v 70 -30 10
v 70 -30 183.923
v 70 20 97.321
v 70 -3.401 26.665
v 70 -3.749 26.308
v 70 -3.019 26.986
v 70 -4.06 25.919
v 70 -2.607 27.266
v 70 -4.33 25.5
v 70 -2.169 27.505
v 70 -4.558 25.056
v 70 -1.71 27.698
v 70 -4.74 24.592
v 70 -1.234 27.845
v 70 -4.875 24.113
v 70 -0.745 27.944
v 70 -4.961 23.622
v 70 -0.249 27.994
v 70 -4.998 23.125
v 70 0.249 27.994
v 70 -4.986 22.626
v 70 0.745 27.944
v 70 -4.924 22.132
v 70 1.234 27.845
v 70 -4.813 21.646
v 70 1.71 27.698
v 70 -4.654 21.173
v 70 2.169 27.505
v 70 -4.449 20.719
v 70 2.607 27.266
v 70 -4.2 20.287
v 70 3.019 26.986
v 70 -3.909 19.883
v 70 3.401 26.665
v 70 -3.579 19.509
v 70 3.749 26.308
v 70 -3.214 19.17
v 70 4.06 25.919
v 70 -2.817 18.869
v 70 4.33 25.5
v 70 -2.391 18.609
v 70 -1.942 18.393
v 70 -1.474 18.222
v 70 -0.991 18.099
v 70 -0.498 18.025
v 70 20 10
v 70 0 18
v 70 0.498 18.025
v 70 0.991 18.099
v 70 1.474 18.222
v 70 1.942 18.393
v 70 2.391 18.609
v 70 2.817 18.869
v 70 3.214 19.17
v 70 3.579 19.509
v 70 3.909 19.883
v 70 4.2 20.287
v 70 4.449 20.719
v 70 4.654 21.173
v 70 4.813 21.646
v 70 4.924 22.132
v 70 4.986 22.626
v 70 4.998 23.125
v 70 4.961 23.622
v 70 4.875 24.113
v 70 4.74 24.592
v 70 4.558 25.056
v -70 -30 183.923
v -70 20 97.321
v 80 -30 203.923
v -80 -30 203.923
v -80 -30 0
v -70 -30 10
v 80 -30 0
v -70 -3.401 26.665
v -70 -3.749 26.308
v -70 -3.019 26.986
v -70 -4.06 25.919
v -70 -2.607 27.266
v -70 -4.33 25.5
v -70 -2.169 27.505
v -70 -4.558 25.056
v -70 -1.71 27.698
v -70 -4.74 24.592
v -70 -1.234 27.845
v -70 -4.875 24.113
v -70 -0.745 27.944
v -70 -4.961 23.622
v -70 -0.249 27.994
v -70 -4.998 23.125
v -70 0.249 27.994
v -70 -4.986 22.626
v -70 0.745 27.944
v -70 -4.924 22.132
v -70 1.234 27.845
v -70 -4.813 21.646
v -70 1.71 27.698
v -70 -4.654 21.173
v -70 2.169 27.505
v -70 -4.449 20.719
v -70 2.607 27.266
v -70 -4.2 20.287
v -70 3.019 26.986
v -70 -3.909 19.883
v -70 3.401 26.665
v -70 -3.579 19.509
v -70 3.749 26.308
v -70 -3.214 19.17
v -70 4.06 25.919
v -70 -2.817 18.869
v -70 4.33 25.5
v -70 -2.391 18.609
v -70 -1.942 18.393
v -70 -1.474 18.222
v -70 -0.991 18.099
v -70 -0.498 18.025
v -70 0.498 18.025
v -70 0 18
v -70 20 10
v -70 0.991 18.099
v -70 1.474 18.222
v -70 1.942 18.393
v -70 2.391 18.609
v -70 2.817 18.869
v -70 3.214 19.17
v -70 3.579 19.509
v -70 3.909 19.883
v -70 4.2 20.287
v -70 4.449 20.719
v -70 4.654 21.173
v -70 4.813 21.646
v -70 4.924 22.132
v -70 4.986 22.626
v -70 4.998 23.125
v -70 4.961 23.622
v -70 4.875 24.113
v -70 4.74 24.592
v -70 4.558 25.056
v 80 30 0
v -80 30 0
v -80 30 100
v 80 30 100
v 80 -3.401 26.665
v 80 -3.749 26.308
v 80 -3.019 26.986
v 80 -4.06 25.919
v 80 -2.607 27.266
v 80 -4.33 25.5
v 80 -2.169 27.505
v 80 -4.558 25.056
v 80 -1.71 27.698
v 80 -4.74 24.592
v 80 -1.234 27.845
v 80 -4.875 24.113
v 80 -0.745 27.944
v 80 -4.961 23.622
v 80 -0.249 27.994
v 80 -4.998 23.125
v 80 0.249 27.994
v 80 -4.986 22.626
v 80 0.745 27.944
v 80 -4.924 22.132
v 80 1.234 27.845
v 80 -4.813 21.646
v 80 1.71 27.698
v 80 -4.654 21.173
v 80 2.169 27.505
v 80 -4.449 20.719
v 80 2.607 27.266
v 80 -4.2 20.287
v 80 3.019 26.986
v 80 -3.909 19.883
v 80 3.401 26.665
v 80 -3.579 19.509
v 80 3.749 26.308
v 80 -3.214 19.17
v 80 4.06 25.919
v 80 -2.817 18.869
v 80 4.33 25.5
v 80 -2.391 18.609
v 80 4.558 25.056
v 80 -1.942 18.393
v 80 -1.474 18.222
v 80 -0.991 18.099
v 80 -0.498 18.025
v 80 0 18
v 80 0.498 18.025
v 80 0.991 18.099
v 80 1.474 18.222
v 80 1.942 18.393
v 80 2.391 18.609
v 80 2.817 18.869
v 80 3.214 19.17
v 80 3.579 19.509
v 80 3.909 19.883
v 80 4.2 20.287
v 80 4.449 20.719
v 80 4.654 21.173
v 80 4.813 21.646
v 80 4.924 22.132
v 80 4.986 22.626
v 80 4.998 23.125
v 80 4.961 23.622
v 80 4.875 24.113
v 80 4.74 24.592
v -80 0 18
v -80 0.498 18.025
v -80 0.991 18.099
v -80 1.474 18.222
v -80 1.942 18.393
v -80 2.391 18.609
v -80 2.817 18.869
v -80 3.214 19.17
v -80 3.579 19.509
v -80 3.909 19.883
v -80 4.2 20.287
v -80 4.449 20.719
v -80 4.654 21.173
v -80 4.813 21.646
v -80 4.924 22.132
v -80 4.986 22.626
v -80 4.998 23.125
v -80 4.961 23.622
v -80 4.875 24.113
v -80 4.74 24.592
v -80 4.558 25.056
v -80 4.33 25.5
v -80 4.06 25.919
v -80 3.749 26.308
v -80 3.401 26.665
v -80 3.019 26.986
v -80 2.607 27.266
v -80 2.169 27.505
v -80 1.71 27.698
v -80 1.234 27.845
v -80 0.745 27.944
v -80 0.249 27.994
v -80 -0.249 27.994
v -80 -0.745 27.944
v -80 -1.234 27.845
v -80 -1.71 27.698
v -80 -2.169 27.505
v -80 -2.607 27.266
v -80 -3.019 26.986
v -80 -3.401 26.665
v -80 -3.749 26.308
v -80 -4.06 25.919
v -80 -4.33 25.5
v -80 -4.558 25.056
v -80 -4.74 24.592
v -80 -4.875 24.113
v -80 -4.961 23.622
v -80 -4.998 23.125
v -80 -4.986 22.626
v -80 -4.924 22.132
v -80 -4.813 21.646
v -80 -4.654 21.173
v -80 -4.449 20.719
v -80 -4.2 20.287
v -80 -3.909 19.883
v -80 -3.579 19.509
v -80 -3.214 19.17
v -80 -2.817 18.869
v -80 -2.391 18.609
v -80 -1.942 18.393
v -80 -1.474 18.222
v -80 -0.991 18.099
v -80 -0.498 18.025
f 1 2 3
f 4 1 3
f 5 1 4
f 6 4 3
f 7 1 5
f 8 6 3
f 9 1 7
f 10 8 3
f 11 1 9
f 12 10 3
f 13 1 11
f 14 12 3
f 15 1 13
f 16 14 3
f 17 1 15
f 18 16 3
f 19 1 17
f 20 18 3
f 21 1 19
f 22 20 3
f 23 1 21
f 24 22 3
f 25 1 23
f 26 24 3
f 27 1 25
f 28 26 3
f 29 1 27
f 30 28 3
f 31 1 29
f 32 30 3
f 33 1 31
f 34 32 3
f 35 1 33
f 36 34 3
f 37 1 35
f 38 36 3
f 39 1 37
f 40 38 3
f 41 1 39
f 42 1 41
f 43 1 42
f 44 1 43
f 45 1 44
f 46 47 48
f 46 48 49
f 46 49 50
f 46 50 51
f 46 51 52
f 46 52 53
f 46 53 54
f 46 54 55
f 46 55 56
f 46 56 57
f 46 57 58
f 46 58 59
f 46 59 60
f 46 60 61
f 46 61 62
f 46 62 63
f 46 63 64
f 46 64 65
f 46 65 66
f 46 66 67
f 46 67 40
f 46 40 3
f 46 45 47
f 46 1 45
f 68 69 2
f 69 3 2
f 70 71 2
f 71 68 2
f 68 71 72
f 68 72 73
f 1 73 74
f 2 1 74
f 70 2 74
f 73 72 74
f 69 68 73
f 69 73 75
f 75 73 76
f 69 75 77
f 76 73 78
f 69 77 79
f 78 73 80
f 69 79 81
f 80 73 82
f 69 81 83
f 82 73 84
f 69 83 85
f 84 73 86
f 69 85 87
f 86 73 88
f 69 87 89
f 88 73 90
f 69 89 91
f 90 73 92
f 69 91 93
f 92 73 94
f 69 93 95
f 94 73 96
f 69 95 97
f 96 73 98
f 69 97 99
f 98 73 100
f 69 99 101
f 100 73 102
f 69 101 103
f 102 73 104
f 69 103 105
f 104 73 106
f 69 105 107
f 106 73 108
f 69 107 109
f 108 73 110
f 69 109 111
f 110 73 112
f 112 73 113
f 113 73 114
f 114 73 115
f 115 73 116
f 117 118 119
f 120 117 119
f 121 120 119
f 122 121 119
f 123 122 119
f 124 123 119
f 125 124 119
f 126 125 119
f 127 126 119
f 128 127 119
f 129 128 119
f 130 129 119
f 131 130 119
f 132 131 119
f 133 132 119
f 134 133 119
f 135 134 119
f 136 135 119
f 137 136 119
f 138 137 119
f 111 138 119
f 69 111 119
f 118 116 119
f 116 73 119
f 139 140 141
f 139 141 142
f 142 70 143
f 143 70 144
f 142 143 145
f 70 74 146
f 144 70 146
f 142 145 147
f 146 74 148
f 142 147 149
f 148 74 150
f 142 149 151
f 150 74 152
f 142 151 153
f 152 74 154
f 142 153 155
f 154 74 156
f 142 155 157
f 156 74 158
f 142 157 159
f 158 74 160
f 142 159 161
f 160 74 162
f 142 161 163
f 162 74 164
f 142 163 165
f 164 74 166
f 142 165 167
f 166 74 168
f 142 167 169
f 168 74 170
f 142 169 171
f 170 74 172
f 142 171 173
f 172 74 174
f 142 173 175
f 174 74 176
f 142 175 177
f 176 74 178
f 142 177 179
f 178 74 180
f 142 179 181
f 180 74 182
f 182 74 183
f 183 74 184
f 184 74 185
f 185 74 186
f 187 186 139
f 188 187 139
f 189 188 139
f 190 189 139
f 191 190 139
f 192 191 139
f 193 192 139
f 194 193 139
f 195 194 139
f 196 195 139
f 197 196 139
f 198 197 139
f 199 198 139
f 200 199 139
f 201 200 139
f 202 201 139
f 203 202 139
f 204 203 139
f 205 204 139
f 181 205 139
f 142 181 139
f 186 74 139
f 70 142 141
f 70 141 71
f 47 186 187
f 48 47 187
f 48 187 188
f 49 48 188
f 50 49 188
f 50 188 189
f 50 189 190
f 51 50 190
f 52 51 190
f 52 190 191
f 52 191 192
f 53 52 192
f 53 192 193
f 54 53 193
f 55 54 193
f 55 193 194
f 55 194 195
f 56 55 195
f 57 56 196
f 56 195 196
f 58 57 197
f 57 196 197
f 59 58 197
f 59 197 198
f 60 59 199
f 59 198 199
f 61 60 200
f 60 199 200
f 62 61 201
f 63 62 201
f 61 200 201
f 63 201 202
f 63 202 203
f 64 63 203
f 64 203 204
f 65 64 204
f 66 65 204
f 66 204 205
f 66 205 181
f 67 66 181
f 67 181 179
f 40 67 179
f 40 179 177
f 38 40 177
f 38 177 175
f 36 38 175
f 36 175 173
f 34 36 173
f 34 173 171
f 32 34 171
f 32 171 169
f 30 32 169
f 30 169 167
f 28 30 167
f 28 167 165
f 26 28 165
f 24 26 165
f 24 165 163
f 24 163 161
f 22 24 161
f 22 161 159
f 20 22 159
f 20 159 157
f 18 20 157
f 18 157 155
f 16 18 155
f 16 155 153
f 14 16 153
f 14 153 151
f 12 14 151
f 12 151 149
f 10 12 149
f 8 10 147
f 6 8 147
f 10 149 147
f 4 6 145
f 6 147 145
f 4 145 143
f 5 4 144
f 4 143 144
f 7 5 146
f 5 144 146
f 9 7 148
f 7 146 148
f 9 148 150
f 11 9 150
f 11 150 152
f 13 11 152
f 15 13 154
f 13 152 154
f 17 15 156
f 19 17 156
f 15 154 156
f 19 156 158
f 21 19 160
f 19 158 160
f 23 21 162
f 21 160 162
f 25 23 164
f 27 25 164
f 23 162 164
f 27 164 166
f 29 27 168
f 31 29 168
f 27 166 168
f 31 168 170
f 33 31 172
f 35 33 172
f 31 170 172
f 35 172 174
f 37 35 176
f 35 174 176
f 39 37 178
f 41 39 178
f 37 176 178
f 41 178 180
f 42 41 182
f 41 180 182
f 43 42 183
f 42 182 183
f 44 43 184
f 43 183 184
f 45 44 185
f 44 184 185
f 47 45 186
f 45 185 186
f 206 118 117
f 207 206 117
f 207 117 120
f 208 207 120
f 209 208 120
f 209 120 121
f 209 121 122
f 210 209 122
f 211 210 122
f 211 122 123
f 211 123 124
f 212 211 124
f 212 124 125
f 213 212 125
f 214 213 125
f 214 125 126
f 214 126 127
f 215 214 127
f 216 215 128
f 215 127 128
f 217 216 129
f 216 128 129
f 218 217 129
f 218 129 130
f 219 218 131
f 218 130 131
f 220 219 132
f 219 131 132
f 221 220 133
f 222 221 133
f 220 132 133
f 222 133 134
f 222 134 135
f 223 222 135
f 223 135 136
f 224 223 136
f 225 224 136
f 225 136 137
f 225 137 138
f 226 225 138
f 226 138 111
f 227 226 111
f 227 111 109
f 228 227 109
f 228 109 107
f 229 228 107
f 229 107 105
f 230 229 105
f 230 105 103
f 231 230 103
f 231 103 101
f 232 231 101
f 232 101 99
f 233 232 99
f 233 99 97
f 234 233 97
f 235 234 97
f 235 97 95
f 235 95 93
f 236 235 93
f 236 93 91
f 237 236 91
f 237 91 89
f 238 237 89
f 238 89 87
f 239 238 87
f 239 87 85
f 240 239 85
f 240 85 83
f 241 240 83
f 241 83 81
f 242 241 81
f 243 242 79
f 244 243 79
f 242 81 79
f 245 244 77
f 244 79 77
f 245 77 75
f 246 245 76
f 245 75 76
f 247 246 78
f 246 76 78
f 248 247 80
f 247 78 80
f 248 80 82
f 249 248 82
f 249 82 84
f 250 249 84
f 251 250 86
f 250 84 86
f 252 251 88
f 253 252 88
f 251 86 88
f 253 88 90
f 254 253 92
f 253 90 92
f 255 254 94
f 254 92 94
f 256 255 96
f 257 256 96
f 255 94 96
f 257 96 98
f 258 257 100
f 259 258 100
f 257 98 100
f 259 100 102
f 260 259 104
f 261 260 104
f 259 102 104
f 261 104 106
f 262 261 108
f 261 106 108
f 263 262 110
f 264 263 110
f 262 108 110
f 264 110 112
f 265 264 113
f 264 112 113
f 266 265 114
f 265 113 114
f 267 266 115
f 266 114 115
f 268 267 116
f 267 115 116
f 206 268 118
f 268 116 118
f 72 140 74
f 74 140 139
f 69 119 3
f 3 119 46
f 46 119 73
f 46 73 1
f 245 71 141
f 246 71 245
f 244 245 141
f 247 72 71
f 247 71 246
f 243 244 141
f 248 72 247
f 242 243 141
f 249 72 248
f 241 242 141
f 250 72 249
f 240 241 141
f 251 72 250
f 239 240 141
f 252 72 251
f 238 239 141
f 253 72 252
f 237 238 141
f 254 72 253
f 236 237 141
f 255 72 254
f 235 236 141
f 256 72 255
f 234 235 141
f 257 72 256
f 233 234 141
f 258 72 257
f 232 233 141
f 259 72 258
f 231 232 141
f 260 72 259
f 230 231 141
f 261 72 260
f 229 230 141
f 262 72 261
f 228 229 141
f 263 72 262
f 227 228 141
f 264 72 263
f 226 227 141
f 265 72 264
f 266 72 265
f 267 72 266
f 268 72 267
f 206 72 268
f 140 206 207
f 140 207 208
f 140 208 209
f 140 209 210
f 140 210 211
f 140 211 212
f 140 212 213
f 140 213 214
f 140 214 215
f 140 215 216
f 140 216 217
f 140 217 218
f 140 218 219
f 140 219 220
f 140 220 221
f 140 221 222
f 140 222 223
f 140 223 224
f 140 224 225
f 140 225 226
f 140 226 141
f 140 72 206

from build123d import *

# Parameters (mm, degrees)
SKETCH2_W           = 160
SKETCH2_H           = 60
BOSS_EXTRUDE1_DEPTH = 230
CUT_EXTRUDE1_REACH  = 162
SHELL1_T            = -10
SKETCH5_R           = 5
CUT_EXTRUDE2_DEPTH  = 161


with BuildPart() as part:
    # Sketch2 → Boss-Extrude1 (new body)
    with BuildSketch(Plane.XY):
        Rectangle(SKETCH2_W, SKETCH2_H)
    extrude(amount=BOSS_EXTRUDE1_DEPTH)

    # Sketch3 → Cut-Extrude1 (cut, up to next)
    with BuildSketch(Plane(origin=(80, 0, 0), x_dir=(0, 0, -1), z_dir=(1, 0, 0)), mode=Mode.PRIVATE) as cut_extrude1_sk1:
        Polygon((-100, 30), (-203.923048454, -30), (-230, -30), (-230, 30), align=None)
    cut_extrude1_tool1 = extrude(cut_extrude1_sk1.sketch, amount=-CUT_EXTRUDE1_REACH, mode=Mode.PRIVATE) & part.part
    add(cut_extrude1_tool1.solids().sort_by_distance((80, 6.658449, 185.214376))[0], mode=Mode.SUBTRACT)

    # Shell1
    shell1_openings = [part.faces().sort_by_distance(p)[0] for p in [
        (0, -30, 101.961524227),
    ]]
    offset(amount=SHELL1_T, openings=shell1_openings, kind=Kind.INTERSECTION)

    # Sketch5 → Cut-Extrude2 (cut, through all)
    with BuildSketch(Plane(origin=(80, 0, 0), x_dir=(0, 0, -1), z_dir=(1, 0, 0))):
        with Locations((-23, 0)):
            Circle(SKETCH5_R)
    extrude(amount=-CUT_EXTRUDE2_DEPTH, mode=Mode.SUBTRACT)


solid = part.part
